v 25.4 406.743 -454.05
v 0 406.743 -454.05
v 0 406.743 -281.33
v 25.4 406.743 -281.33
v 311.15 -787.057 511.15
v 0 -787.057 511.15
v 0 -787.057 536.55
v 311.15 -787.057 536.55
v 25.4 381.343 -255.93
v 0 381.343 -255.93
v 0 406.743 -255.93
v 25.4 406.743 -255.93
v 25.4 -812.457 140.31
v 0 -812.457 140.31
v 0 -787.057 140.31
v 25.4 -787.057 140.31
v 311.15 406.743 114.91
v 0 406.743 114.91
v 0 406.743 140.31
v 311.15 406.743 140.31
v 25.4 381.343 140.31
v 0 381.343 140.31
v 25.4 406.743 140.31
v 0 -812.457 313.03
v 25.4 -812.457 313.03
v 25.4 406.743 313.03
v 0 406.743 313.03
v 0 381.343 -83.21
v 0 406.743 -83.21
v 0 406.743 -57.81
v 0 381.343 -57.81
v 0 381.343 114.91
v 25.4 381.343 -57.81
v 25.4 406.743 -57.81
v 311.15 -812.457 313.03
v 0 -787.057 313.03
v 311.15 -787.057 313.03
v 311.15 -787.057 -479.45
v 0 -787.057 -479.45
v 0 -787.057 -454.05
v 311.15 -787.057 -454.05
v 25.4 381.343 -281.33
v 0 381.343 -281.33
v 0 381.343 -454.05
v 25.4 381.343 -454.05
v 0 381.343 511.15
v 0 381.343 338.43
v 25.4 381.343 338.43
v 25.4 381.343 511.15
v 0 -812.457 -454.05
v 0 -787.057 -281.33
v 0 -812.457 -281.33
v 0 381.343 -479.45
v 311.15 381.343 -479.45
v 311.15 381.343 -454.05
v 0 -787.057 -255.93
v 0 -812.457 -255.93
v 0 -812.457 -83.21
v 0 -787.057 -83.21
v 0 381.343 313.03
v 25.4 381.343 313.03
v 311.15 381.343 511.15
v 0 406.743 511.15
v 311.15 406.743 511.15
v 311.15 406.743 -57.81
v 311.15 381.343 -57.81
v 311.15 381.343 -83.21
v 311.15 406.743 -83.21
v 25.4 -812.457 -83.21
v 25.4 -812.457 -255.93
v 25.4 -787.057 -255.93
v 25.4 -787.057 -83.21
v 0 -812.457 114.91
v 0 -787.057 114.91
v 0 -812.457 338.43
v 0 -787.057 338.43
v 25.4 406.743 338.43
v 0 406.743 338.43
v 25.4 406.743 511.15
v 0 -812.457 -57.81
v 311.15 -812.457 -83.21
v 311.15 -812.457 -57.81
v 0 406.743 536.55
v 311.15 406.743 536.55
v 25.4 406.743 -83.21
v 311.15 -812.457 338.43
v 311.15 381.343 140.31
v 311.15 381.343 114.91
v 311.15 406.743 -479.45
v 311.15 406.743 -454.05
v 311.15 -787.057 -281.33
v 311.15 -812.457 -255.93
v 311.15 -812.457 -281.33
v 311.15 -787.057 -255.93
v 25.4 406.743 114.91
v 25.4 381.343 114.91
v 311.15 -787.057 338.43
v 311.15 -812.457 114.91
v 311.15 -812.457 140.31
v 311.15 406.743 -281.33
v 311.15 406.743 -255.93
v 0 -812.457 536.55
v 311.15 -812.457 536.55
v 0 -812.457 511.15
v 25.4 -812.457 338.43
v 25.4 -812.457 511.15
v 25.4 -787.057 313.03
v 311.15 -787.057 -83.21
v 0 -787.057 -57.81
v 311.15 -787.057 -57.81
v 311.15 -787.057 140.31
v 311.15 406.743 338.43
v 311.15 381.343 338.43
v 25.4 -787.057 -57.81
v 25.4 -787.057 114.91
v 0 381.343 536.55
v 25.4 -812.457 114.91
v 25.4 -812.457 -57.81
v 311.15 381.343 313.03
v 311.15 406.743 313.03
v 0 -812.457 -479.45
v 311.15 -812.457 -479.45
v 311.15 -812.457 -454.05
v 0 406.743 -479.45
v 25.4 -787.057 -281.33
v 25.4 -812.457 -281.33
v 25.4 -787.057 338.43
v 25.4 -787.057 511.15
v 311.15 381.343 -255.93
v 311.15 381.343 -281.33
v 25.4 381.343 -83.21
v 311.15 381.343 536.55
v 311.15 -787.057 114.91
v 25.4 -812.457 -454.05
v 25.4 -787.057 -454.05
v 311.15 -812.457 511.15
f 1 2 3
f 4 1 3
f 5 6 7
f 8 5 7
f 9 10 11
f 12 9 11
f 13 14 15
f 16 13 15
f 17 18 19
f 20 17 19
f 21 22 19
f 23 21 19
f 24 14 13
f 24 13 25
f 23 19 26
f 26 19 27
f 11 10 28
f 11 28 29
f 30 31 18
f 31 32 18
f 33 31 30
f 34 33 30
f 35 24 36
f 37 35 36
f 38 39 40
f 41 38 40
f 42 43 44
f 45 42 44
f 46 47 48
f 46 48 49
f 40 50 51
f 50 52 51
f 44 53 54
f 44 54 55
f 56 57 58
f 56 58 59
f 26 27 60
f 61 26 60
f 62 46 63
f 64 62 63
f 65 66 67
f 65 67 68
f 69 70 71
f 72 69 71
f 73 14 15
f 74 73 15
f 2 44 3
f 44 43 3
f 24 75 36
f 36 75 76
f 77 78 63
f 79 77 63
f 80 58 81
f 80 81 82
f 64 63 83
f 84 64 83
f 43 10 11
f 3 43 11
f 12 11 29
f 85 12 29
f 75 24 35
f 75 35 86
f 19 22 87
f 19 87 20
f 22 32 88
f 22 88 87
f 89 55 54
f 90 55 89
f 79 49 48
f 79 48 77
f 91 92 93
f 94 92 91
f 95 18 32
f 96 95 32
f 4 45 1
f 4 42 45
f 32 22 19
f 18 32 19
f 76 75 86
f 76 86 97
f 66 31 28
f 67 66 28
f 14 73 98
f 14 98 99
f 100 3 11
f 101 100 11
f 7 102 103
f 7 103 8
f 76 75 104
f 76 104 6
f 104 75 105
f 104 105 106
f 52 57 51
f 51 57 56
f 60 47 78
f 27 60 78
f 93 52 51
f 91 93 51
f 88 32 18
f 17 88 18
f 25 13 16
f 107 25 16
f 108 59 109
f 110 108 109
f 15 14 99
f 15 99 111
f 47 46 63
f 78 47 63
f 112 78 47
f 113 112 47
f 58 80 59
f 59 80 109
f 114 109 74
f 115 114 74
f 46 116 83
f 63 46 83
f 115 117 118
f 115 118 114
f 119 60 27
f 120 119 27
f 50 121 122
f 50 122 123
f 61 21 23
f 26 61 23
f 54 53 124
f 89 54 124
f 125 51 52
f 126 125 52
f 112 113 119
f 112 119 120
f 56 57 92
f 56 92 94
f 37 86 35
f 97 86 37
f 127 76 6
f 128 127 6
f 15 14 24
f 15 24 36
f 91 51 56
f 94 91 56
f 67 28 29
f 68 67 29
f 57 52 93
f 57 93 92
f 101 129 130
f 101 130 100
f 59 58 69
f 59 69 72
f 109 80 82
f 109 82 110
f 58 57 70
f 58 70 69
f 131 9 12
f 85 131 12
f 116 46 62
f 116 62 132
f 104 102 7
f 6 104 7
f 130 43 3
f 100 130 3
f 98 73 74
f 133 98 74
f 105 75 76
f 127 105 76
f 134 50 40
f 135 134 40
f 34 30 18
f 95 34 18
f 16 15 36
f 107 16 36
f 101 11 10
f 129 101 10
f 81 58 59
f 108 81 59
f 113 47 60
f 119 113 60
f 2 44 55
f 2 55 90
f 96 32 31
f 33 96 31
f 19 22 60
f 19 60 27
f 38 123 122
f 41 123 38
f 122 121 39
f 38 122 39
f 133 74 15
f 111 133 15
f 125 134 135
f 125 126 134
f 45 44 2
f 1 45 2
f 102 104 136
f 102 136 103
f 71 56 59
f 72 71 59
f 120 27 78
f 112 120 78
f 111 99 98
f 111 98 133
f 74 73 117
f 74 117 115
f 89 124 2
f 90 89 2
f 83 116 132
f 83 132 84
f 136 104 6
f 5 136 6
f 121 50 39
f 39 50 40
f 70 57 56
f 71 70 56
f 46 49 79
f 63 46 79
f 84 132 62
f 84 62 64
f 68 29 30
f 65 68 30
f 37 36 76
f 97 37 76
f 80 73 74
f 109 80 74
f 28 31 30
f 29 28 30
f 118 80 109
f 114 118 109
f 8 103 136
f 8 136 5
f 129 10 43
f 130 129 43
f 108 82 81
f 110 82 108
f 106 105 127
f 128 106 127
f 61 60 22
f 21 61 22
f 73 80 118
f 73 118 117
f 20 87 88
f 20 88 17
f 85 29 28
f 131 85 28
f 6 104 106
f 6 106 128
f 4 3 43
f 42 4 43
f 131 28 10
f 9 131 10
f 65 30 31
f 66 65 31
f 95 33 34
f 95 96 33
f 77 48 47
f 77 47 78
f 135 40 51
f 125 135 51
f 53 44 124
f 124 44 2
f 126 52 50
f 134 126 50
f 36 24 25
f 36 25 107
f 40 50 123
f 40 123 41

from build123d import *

# Parameters (mm, degrees)
F0_W     = 25.4
F0_H     = 25.4
F1_DEPTH = 311.15
F0_H_2   = 172.72
F2_DEPTH = 25.4
F3_DEPTH = 25.4
F4_DEPTH = 311.15


with BuildPart() as f1:
    # F0 (on Right) → F1 (new body)
    with BuildSketch(Plane.YZ):
        with Locations((-799.7573850555, 127.6102497262)):
            Rectangle(F0_W, F0_H)
    extrude(amount=F1_DEPTH)


with BuildPart() as f1b:
    # F0 (on Right) → F1, piece 2 (new body)
    with BuildSketch(Plane.YZ):
        with Locations((-799.7573850555, -466.7497502738)):
            Rectangle(F0_W, F0_H)
    extrude(amount=F1_DEPTH)


with BuildPart() as f1c:
    # F0 (on Right) → F1, piece 3 (new body)
    with BuildSketch(Plane.YZ):
        with Locations((-799.7573850555, 325.7302497262)):
            Rectangle(F0_W, F0_H)
    extrude(amount=F1_DEPTH)


with BuildPart() as f1d:
    # F0 (on Right) → F1, piece 4 (new body)
    with BuildSketch(Plane.YZ):
        with Locations((-799.7573850555, -268.6297502738)):
            Rectangle(F0_W, F0_H)
    extrude(amount=F1_DEPTH)


with BuildPart() as f1e:
    # F0 (on Right) → F1, piece 5 (new body)
    with BuildSketch(Plane.YZ):
        with Locations((-799.7573850555, -70.5097502738)):
            Rectangle(F0_W, F0_H)
    extrude(amount=F1_DEPTH)


with BuildPart() as f1f:
    # F0 (on Right) → F1, piece 6 (new body)
    with BuildSketch(Plane.YZ):
        with Locations((-799.7573850555, 523.8502497262)):
            Rectangle(F0_W, F0_H)
    extrude(amount=F1_DEPTH)


with BuildPart() as f2:
    # F0 (on Right) → F2 (new body)
    with BuildSketch(Plane.YZ):
        with Locations((-799.7573850555, -169.5697502738)):
            Rectangle(F0_W, F0_H_2)
    extrude(amount=F2_DEPTH)


with BuildPart() as f2b:
    # F0 (on Right) → F2, piece 2 (new body)
    with BuildSketch(Plane.YZ):
        with Locations((-799.7573850555, 226.6702497262)):
            Rectangle(F0_W, F0_H_2)
    extrude(amount=F2_DEPTH)


with BuildPart() as f2c:
    # F0 (on Right) → F2, piece 3 (new body)
    with BuildSketch(Plane.YZ):
        with Locations((-799.7573850555, 424.7902497262)):
            Rectangle(F0_W, F0_H_2)
    extrude(amount=F2_DEPTH)


with BuildPart() as f2d:
    # F0 (on Right) → F2, piece 4 (new body)
    with BuildSketch(Plane.YZ):
        with Locations((-799.7573850555, 28.5502497262)):
            Rectangle(F0_W, F0_H_2)
    extrude(amount=F2_DEPTH)


with BuildPart() as f2e:
    # F0 (on Right) → F2, piece 5 (new body)
    with BuildSketch(Plane.YZ):
        Polygon((-812.4573850555, -454.0497502738), (-787.0573850555, -454.0497502738), (-787.0573850555, -296.3315248489), (-787.0573850555, -281.3297502738), (-812.4573850555, -281.3297502738), (-812.4573850555, -296.3315248489), align=None)
    extrude(amount=F2_DEPTH)


with BuildPart() as f3:
    # F0 (on Right) → F3 (new body)
    with BuildSketch(Plane.YZ):
        Polygon((381.3426149445, -57.8097502738), (406.7426149445, -57.8097502738), (406.7426149445, 100.4313870019), (406.7426149445, 114.9102497262), (381.3426149445, 114.9102497262), align=None)
    extrude(amount=F3_DEPTH)


with BuildPart() as f3b:
    # F0 (on Right) → F3, piece 2 (new body)
    with BuildSketch(Plane.YZ):
        Polygon((381.3426149445, -255.9297502738), (406.7426149445, -255.9297502738), (406.7426149445, -83.2097502738), (393.4404167575, -83.2097502738), (381.3426149445, -83.2097502738), align=None)
    extrude(amount=F3_DEPTH)


with BuildPart() as f3c:
    # F0 (on Right) → F3, piece 3 (new body)
    with BuildSketch(Plane.YZ):
        with Locations((394.0426149445, 424.7902497262)):
            Rectangle(F0_W, F0_H_2)
    extrude(amount=F3_DEPTH)


with BuildPart() as f3d:
    # F0 (on Right) → F3, piece 4 (new body)
    with BuildSketch(Plane.YZ):
        Polygon((381.3426149445, -454.0497502738), (406.7426149445, -454.0497502738), (406.7426149445, -281.3297502738), (381.8395647449, -281.3297502738), (381.3426149445, -281.3297502738), align=None)
    extrude(amount=F3_DEPTH)


with BuildPart() as f3e:
    # F0 (on Right) → F3, piece 5 (new body)
    with BuildSketch(Plane.YZ):
        Polygon((381.3426149445, 140.3102497262), (406.7426149445, 140.3102497262), (406.7426149445, 313.0302497262), (395.5076758461, 313.0302497262), (381.3426149445, 313.0302497262), align=None)
    extrude(amount=F3_DEPTH)


with BuildPart() as f4:
    # F0 (on Right) → F4 (new body)
    with BuildSketch(Plane.YZ):
        Polygon((395.5076758461, 313.0302497262), (406.7426149445, 313.0302497262), (406.7426149445, 338.4302497262), (381.3426149445, 338.4302497262), (381.3426149445, 313.0302497262), align=None)
    extrude(amount=F4_DEPTH)


with BuildPart() as f4b:
    # F0 (on Right) → F4, piece 2 (new body)
    with BuildSketch(Plane.YZ):
        with Locations((394.0426149445, 523.8502497262)):
            Rectangle(F0_W, F0_H)
    extrude(amount=F4_DEPTH)


with BuildPart() as f4c:
    # F0 (on Right) → F4, piece 3 (new body)
    with BuildSketch(Plane.YZ):
        with Locations((394.0426149445, -466.7497502738)):
            Rectangle(F0_W, F0_H)
    extrude(amount=F4_DEPTH)


with BuildPart() as f4d:
    # F0 (on Right) → F4, piece 4 (new body)
    with BuildSketch(Plane.YZ):
        Polygon((381.8395647449, -281.3297502738), (406.7426149445, -281.3297502738), (406.7426149445, -255.9297502738), (381.3426149445, -255.9297502738), (381.3426149445, -281.3297502738), align=None)
    extrude(amount=F4_DEPTH)


with BuildPart() as f4e:
    # F0 (on Right) → F4, piece 5 (new body)
    with BuildSketch(Plane.YZ):
        with Locations((394.0426149445, 127.6102497262)):
            Rectangle(F0_W, F0_H)
    extrude(amount=F4_DEPTH)


with BuildPart() as f4f:
    # F0 (on Right) → F4, piece 6 (new body)
    with BuildSketch(Plane.YZ):
        Polygon((393.4404167575, -83.2097502738), (406.7426149445, -83.2097502738), (406.7426149445, -57.8097502738), (381.3426149445, -57.8097502738), (381.3426149445, -83.2097502738), align=None)
    extrude(amount=F4_DEPTH)


solid = Compound([f1.part, f1b.part, f1c.part, f1d.part, f1e.part, f1f.part, f2.part, f2b.part, f2c.part, f2d.part, f2e.part, f3.part, f3b.part, f3c.part, f3d.part, f3e.part, f4.part, f4b.part, f4c.part, f4d.part, f4e.part, f4f.part])
